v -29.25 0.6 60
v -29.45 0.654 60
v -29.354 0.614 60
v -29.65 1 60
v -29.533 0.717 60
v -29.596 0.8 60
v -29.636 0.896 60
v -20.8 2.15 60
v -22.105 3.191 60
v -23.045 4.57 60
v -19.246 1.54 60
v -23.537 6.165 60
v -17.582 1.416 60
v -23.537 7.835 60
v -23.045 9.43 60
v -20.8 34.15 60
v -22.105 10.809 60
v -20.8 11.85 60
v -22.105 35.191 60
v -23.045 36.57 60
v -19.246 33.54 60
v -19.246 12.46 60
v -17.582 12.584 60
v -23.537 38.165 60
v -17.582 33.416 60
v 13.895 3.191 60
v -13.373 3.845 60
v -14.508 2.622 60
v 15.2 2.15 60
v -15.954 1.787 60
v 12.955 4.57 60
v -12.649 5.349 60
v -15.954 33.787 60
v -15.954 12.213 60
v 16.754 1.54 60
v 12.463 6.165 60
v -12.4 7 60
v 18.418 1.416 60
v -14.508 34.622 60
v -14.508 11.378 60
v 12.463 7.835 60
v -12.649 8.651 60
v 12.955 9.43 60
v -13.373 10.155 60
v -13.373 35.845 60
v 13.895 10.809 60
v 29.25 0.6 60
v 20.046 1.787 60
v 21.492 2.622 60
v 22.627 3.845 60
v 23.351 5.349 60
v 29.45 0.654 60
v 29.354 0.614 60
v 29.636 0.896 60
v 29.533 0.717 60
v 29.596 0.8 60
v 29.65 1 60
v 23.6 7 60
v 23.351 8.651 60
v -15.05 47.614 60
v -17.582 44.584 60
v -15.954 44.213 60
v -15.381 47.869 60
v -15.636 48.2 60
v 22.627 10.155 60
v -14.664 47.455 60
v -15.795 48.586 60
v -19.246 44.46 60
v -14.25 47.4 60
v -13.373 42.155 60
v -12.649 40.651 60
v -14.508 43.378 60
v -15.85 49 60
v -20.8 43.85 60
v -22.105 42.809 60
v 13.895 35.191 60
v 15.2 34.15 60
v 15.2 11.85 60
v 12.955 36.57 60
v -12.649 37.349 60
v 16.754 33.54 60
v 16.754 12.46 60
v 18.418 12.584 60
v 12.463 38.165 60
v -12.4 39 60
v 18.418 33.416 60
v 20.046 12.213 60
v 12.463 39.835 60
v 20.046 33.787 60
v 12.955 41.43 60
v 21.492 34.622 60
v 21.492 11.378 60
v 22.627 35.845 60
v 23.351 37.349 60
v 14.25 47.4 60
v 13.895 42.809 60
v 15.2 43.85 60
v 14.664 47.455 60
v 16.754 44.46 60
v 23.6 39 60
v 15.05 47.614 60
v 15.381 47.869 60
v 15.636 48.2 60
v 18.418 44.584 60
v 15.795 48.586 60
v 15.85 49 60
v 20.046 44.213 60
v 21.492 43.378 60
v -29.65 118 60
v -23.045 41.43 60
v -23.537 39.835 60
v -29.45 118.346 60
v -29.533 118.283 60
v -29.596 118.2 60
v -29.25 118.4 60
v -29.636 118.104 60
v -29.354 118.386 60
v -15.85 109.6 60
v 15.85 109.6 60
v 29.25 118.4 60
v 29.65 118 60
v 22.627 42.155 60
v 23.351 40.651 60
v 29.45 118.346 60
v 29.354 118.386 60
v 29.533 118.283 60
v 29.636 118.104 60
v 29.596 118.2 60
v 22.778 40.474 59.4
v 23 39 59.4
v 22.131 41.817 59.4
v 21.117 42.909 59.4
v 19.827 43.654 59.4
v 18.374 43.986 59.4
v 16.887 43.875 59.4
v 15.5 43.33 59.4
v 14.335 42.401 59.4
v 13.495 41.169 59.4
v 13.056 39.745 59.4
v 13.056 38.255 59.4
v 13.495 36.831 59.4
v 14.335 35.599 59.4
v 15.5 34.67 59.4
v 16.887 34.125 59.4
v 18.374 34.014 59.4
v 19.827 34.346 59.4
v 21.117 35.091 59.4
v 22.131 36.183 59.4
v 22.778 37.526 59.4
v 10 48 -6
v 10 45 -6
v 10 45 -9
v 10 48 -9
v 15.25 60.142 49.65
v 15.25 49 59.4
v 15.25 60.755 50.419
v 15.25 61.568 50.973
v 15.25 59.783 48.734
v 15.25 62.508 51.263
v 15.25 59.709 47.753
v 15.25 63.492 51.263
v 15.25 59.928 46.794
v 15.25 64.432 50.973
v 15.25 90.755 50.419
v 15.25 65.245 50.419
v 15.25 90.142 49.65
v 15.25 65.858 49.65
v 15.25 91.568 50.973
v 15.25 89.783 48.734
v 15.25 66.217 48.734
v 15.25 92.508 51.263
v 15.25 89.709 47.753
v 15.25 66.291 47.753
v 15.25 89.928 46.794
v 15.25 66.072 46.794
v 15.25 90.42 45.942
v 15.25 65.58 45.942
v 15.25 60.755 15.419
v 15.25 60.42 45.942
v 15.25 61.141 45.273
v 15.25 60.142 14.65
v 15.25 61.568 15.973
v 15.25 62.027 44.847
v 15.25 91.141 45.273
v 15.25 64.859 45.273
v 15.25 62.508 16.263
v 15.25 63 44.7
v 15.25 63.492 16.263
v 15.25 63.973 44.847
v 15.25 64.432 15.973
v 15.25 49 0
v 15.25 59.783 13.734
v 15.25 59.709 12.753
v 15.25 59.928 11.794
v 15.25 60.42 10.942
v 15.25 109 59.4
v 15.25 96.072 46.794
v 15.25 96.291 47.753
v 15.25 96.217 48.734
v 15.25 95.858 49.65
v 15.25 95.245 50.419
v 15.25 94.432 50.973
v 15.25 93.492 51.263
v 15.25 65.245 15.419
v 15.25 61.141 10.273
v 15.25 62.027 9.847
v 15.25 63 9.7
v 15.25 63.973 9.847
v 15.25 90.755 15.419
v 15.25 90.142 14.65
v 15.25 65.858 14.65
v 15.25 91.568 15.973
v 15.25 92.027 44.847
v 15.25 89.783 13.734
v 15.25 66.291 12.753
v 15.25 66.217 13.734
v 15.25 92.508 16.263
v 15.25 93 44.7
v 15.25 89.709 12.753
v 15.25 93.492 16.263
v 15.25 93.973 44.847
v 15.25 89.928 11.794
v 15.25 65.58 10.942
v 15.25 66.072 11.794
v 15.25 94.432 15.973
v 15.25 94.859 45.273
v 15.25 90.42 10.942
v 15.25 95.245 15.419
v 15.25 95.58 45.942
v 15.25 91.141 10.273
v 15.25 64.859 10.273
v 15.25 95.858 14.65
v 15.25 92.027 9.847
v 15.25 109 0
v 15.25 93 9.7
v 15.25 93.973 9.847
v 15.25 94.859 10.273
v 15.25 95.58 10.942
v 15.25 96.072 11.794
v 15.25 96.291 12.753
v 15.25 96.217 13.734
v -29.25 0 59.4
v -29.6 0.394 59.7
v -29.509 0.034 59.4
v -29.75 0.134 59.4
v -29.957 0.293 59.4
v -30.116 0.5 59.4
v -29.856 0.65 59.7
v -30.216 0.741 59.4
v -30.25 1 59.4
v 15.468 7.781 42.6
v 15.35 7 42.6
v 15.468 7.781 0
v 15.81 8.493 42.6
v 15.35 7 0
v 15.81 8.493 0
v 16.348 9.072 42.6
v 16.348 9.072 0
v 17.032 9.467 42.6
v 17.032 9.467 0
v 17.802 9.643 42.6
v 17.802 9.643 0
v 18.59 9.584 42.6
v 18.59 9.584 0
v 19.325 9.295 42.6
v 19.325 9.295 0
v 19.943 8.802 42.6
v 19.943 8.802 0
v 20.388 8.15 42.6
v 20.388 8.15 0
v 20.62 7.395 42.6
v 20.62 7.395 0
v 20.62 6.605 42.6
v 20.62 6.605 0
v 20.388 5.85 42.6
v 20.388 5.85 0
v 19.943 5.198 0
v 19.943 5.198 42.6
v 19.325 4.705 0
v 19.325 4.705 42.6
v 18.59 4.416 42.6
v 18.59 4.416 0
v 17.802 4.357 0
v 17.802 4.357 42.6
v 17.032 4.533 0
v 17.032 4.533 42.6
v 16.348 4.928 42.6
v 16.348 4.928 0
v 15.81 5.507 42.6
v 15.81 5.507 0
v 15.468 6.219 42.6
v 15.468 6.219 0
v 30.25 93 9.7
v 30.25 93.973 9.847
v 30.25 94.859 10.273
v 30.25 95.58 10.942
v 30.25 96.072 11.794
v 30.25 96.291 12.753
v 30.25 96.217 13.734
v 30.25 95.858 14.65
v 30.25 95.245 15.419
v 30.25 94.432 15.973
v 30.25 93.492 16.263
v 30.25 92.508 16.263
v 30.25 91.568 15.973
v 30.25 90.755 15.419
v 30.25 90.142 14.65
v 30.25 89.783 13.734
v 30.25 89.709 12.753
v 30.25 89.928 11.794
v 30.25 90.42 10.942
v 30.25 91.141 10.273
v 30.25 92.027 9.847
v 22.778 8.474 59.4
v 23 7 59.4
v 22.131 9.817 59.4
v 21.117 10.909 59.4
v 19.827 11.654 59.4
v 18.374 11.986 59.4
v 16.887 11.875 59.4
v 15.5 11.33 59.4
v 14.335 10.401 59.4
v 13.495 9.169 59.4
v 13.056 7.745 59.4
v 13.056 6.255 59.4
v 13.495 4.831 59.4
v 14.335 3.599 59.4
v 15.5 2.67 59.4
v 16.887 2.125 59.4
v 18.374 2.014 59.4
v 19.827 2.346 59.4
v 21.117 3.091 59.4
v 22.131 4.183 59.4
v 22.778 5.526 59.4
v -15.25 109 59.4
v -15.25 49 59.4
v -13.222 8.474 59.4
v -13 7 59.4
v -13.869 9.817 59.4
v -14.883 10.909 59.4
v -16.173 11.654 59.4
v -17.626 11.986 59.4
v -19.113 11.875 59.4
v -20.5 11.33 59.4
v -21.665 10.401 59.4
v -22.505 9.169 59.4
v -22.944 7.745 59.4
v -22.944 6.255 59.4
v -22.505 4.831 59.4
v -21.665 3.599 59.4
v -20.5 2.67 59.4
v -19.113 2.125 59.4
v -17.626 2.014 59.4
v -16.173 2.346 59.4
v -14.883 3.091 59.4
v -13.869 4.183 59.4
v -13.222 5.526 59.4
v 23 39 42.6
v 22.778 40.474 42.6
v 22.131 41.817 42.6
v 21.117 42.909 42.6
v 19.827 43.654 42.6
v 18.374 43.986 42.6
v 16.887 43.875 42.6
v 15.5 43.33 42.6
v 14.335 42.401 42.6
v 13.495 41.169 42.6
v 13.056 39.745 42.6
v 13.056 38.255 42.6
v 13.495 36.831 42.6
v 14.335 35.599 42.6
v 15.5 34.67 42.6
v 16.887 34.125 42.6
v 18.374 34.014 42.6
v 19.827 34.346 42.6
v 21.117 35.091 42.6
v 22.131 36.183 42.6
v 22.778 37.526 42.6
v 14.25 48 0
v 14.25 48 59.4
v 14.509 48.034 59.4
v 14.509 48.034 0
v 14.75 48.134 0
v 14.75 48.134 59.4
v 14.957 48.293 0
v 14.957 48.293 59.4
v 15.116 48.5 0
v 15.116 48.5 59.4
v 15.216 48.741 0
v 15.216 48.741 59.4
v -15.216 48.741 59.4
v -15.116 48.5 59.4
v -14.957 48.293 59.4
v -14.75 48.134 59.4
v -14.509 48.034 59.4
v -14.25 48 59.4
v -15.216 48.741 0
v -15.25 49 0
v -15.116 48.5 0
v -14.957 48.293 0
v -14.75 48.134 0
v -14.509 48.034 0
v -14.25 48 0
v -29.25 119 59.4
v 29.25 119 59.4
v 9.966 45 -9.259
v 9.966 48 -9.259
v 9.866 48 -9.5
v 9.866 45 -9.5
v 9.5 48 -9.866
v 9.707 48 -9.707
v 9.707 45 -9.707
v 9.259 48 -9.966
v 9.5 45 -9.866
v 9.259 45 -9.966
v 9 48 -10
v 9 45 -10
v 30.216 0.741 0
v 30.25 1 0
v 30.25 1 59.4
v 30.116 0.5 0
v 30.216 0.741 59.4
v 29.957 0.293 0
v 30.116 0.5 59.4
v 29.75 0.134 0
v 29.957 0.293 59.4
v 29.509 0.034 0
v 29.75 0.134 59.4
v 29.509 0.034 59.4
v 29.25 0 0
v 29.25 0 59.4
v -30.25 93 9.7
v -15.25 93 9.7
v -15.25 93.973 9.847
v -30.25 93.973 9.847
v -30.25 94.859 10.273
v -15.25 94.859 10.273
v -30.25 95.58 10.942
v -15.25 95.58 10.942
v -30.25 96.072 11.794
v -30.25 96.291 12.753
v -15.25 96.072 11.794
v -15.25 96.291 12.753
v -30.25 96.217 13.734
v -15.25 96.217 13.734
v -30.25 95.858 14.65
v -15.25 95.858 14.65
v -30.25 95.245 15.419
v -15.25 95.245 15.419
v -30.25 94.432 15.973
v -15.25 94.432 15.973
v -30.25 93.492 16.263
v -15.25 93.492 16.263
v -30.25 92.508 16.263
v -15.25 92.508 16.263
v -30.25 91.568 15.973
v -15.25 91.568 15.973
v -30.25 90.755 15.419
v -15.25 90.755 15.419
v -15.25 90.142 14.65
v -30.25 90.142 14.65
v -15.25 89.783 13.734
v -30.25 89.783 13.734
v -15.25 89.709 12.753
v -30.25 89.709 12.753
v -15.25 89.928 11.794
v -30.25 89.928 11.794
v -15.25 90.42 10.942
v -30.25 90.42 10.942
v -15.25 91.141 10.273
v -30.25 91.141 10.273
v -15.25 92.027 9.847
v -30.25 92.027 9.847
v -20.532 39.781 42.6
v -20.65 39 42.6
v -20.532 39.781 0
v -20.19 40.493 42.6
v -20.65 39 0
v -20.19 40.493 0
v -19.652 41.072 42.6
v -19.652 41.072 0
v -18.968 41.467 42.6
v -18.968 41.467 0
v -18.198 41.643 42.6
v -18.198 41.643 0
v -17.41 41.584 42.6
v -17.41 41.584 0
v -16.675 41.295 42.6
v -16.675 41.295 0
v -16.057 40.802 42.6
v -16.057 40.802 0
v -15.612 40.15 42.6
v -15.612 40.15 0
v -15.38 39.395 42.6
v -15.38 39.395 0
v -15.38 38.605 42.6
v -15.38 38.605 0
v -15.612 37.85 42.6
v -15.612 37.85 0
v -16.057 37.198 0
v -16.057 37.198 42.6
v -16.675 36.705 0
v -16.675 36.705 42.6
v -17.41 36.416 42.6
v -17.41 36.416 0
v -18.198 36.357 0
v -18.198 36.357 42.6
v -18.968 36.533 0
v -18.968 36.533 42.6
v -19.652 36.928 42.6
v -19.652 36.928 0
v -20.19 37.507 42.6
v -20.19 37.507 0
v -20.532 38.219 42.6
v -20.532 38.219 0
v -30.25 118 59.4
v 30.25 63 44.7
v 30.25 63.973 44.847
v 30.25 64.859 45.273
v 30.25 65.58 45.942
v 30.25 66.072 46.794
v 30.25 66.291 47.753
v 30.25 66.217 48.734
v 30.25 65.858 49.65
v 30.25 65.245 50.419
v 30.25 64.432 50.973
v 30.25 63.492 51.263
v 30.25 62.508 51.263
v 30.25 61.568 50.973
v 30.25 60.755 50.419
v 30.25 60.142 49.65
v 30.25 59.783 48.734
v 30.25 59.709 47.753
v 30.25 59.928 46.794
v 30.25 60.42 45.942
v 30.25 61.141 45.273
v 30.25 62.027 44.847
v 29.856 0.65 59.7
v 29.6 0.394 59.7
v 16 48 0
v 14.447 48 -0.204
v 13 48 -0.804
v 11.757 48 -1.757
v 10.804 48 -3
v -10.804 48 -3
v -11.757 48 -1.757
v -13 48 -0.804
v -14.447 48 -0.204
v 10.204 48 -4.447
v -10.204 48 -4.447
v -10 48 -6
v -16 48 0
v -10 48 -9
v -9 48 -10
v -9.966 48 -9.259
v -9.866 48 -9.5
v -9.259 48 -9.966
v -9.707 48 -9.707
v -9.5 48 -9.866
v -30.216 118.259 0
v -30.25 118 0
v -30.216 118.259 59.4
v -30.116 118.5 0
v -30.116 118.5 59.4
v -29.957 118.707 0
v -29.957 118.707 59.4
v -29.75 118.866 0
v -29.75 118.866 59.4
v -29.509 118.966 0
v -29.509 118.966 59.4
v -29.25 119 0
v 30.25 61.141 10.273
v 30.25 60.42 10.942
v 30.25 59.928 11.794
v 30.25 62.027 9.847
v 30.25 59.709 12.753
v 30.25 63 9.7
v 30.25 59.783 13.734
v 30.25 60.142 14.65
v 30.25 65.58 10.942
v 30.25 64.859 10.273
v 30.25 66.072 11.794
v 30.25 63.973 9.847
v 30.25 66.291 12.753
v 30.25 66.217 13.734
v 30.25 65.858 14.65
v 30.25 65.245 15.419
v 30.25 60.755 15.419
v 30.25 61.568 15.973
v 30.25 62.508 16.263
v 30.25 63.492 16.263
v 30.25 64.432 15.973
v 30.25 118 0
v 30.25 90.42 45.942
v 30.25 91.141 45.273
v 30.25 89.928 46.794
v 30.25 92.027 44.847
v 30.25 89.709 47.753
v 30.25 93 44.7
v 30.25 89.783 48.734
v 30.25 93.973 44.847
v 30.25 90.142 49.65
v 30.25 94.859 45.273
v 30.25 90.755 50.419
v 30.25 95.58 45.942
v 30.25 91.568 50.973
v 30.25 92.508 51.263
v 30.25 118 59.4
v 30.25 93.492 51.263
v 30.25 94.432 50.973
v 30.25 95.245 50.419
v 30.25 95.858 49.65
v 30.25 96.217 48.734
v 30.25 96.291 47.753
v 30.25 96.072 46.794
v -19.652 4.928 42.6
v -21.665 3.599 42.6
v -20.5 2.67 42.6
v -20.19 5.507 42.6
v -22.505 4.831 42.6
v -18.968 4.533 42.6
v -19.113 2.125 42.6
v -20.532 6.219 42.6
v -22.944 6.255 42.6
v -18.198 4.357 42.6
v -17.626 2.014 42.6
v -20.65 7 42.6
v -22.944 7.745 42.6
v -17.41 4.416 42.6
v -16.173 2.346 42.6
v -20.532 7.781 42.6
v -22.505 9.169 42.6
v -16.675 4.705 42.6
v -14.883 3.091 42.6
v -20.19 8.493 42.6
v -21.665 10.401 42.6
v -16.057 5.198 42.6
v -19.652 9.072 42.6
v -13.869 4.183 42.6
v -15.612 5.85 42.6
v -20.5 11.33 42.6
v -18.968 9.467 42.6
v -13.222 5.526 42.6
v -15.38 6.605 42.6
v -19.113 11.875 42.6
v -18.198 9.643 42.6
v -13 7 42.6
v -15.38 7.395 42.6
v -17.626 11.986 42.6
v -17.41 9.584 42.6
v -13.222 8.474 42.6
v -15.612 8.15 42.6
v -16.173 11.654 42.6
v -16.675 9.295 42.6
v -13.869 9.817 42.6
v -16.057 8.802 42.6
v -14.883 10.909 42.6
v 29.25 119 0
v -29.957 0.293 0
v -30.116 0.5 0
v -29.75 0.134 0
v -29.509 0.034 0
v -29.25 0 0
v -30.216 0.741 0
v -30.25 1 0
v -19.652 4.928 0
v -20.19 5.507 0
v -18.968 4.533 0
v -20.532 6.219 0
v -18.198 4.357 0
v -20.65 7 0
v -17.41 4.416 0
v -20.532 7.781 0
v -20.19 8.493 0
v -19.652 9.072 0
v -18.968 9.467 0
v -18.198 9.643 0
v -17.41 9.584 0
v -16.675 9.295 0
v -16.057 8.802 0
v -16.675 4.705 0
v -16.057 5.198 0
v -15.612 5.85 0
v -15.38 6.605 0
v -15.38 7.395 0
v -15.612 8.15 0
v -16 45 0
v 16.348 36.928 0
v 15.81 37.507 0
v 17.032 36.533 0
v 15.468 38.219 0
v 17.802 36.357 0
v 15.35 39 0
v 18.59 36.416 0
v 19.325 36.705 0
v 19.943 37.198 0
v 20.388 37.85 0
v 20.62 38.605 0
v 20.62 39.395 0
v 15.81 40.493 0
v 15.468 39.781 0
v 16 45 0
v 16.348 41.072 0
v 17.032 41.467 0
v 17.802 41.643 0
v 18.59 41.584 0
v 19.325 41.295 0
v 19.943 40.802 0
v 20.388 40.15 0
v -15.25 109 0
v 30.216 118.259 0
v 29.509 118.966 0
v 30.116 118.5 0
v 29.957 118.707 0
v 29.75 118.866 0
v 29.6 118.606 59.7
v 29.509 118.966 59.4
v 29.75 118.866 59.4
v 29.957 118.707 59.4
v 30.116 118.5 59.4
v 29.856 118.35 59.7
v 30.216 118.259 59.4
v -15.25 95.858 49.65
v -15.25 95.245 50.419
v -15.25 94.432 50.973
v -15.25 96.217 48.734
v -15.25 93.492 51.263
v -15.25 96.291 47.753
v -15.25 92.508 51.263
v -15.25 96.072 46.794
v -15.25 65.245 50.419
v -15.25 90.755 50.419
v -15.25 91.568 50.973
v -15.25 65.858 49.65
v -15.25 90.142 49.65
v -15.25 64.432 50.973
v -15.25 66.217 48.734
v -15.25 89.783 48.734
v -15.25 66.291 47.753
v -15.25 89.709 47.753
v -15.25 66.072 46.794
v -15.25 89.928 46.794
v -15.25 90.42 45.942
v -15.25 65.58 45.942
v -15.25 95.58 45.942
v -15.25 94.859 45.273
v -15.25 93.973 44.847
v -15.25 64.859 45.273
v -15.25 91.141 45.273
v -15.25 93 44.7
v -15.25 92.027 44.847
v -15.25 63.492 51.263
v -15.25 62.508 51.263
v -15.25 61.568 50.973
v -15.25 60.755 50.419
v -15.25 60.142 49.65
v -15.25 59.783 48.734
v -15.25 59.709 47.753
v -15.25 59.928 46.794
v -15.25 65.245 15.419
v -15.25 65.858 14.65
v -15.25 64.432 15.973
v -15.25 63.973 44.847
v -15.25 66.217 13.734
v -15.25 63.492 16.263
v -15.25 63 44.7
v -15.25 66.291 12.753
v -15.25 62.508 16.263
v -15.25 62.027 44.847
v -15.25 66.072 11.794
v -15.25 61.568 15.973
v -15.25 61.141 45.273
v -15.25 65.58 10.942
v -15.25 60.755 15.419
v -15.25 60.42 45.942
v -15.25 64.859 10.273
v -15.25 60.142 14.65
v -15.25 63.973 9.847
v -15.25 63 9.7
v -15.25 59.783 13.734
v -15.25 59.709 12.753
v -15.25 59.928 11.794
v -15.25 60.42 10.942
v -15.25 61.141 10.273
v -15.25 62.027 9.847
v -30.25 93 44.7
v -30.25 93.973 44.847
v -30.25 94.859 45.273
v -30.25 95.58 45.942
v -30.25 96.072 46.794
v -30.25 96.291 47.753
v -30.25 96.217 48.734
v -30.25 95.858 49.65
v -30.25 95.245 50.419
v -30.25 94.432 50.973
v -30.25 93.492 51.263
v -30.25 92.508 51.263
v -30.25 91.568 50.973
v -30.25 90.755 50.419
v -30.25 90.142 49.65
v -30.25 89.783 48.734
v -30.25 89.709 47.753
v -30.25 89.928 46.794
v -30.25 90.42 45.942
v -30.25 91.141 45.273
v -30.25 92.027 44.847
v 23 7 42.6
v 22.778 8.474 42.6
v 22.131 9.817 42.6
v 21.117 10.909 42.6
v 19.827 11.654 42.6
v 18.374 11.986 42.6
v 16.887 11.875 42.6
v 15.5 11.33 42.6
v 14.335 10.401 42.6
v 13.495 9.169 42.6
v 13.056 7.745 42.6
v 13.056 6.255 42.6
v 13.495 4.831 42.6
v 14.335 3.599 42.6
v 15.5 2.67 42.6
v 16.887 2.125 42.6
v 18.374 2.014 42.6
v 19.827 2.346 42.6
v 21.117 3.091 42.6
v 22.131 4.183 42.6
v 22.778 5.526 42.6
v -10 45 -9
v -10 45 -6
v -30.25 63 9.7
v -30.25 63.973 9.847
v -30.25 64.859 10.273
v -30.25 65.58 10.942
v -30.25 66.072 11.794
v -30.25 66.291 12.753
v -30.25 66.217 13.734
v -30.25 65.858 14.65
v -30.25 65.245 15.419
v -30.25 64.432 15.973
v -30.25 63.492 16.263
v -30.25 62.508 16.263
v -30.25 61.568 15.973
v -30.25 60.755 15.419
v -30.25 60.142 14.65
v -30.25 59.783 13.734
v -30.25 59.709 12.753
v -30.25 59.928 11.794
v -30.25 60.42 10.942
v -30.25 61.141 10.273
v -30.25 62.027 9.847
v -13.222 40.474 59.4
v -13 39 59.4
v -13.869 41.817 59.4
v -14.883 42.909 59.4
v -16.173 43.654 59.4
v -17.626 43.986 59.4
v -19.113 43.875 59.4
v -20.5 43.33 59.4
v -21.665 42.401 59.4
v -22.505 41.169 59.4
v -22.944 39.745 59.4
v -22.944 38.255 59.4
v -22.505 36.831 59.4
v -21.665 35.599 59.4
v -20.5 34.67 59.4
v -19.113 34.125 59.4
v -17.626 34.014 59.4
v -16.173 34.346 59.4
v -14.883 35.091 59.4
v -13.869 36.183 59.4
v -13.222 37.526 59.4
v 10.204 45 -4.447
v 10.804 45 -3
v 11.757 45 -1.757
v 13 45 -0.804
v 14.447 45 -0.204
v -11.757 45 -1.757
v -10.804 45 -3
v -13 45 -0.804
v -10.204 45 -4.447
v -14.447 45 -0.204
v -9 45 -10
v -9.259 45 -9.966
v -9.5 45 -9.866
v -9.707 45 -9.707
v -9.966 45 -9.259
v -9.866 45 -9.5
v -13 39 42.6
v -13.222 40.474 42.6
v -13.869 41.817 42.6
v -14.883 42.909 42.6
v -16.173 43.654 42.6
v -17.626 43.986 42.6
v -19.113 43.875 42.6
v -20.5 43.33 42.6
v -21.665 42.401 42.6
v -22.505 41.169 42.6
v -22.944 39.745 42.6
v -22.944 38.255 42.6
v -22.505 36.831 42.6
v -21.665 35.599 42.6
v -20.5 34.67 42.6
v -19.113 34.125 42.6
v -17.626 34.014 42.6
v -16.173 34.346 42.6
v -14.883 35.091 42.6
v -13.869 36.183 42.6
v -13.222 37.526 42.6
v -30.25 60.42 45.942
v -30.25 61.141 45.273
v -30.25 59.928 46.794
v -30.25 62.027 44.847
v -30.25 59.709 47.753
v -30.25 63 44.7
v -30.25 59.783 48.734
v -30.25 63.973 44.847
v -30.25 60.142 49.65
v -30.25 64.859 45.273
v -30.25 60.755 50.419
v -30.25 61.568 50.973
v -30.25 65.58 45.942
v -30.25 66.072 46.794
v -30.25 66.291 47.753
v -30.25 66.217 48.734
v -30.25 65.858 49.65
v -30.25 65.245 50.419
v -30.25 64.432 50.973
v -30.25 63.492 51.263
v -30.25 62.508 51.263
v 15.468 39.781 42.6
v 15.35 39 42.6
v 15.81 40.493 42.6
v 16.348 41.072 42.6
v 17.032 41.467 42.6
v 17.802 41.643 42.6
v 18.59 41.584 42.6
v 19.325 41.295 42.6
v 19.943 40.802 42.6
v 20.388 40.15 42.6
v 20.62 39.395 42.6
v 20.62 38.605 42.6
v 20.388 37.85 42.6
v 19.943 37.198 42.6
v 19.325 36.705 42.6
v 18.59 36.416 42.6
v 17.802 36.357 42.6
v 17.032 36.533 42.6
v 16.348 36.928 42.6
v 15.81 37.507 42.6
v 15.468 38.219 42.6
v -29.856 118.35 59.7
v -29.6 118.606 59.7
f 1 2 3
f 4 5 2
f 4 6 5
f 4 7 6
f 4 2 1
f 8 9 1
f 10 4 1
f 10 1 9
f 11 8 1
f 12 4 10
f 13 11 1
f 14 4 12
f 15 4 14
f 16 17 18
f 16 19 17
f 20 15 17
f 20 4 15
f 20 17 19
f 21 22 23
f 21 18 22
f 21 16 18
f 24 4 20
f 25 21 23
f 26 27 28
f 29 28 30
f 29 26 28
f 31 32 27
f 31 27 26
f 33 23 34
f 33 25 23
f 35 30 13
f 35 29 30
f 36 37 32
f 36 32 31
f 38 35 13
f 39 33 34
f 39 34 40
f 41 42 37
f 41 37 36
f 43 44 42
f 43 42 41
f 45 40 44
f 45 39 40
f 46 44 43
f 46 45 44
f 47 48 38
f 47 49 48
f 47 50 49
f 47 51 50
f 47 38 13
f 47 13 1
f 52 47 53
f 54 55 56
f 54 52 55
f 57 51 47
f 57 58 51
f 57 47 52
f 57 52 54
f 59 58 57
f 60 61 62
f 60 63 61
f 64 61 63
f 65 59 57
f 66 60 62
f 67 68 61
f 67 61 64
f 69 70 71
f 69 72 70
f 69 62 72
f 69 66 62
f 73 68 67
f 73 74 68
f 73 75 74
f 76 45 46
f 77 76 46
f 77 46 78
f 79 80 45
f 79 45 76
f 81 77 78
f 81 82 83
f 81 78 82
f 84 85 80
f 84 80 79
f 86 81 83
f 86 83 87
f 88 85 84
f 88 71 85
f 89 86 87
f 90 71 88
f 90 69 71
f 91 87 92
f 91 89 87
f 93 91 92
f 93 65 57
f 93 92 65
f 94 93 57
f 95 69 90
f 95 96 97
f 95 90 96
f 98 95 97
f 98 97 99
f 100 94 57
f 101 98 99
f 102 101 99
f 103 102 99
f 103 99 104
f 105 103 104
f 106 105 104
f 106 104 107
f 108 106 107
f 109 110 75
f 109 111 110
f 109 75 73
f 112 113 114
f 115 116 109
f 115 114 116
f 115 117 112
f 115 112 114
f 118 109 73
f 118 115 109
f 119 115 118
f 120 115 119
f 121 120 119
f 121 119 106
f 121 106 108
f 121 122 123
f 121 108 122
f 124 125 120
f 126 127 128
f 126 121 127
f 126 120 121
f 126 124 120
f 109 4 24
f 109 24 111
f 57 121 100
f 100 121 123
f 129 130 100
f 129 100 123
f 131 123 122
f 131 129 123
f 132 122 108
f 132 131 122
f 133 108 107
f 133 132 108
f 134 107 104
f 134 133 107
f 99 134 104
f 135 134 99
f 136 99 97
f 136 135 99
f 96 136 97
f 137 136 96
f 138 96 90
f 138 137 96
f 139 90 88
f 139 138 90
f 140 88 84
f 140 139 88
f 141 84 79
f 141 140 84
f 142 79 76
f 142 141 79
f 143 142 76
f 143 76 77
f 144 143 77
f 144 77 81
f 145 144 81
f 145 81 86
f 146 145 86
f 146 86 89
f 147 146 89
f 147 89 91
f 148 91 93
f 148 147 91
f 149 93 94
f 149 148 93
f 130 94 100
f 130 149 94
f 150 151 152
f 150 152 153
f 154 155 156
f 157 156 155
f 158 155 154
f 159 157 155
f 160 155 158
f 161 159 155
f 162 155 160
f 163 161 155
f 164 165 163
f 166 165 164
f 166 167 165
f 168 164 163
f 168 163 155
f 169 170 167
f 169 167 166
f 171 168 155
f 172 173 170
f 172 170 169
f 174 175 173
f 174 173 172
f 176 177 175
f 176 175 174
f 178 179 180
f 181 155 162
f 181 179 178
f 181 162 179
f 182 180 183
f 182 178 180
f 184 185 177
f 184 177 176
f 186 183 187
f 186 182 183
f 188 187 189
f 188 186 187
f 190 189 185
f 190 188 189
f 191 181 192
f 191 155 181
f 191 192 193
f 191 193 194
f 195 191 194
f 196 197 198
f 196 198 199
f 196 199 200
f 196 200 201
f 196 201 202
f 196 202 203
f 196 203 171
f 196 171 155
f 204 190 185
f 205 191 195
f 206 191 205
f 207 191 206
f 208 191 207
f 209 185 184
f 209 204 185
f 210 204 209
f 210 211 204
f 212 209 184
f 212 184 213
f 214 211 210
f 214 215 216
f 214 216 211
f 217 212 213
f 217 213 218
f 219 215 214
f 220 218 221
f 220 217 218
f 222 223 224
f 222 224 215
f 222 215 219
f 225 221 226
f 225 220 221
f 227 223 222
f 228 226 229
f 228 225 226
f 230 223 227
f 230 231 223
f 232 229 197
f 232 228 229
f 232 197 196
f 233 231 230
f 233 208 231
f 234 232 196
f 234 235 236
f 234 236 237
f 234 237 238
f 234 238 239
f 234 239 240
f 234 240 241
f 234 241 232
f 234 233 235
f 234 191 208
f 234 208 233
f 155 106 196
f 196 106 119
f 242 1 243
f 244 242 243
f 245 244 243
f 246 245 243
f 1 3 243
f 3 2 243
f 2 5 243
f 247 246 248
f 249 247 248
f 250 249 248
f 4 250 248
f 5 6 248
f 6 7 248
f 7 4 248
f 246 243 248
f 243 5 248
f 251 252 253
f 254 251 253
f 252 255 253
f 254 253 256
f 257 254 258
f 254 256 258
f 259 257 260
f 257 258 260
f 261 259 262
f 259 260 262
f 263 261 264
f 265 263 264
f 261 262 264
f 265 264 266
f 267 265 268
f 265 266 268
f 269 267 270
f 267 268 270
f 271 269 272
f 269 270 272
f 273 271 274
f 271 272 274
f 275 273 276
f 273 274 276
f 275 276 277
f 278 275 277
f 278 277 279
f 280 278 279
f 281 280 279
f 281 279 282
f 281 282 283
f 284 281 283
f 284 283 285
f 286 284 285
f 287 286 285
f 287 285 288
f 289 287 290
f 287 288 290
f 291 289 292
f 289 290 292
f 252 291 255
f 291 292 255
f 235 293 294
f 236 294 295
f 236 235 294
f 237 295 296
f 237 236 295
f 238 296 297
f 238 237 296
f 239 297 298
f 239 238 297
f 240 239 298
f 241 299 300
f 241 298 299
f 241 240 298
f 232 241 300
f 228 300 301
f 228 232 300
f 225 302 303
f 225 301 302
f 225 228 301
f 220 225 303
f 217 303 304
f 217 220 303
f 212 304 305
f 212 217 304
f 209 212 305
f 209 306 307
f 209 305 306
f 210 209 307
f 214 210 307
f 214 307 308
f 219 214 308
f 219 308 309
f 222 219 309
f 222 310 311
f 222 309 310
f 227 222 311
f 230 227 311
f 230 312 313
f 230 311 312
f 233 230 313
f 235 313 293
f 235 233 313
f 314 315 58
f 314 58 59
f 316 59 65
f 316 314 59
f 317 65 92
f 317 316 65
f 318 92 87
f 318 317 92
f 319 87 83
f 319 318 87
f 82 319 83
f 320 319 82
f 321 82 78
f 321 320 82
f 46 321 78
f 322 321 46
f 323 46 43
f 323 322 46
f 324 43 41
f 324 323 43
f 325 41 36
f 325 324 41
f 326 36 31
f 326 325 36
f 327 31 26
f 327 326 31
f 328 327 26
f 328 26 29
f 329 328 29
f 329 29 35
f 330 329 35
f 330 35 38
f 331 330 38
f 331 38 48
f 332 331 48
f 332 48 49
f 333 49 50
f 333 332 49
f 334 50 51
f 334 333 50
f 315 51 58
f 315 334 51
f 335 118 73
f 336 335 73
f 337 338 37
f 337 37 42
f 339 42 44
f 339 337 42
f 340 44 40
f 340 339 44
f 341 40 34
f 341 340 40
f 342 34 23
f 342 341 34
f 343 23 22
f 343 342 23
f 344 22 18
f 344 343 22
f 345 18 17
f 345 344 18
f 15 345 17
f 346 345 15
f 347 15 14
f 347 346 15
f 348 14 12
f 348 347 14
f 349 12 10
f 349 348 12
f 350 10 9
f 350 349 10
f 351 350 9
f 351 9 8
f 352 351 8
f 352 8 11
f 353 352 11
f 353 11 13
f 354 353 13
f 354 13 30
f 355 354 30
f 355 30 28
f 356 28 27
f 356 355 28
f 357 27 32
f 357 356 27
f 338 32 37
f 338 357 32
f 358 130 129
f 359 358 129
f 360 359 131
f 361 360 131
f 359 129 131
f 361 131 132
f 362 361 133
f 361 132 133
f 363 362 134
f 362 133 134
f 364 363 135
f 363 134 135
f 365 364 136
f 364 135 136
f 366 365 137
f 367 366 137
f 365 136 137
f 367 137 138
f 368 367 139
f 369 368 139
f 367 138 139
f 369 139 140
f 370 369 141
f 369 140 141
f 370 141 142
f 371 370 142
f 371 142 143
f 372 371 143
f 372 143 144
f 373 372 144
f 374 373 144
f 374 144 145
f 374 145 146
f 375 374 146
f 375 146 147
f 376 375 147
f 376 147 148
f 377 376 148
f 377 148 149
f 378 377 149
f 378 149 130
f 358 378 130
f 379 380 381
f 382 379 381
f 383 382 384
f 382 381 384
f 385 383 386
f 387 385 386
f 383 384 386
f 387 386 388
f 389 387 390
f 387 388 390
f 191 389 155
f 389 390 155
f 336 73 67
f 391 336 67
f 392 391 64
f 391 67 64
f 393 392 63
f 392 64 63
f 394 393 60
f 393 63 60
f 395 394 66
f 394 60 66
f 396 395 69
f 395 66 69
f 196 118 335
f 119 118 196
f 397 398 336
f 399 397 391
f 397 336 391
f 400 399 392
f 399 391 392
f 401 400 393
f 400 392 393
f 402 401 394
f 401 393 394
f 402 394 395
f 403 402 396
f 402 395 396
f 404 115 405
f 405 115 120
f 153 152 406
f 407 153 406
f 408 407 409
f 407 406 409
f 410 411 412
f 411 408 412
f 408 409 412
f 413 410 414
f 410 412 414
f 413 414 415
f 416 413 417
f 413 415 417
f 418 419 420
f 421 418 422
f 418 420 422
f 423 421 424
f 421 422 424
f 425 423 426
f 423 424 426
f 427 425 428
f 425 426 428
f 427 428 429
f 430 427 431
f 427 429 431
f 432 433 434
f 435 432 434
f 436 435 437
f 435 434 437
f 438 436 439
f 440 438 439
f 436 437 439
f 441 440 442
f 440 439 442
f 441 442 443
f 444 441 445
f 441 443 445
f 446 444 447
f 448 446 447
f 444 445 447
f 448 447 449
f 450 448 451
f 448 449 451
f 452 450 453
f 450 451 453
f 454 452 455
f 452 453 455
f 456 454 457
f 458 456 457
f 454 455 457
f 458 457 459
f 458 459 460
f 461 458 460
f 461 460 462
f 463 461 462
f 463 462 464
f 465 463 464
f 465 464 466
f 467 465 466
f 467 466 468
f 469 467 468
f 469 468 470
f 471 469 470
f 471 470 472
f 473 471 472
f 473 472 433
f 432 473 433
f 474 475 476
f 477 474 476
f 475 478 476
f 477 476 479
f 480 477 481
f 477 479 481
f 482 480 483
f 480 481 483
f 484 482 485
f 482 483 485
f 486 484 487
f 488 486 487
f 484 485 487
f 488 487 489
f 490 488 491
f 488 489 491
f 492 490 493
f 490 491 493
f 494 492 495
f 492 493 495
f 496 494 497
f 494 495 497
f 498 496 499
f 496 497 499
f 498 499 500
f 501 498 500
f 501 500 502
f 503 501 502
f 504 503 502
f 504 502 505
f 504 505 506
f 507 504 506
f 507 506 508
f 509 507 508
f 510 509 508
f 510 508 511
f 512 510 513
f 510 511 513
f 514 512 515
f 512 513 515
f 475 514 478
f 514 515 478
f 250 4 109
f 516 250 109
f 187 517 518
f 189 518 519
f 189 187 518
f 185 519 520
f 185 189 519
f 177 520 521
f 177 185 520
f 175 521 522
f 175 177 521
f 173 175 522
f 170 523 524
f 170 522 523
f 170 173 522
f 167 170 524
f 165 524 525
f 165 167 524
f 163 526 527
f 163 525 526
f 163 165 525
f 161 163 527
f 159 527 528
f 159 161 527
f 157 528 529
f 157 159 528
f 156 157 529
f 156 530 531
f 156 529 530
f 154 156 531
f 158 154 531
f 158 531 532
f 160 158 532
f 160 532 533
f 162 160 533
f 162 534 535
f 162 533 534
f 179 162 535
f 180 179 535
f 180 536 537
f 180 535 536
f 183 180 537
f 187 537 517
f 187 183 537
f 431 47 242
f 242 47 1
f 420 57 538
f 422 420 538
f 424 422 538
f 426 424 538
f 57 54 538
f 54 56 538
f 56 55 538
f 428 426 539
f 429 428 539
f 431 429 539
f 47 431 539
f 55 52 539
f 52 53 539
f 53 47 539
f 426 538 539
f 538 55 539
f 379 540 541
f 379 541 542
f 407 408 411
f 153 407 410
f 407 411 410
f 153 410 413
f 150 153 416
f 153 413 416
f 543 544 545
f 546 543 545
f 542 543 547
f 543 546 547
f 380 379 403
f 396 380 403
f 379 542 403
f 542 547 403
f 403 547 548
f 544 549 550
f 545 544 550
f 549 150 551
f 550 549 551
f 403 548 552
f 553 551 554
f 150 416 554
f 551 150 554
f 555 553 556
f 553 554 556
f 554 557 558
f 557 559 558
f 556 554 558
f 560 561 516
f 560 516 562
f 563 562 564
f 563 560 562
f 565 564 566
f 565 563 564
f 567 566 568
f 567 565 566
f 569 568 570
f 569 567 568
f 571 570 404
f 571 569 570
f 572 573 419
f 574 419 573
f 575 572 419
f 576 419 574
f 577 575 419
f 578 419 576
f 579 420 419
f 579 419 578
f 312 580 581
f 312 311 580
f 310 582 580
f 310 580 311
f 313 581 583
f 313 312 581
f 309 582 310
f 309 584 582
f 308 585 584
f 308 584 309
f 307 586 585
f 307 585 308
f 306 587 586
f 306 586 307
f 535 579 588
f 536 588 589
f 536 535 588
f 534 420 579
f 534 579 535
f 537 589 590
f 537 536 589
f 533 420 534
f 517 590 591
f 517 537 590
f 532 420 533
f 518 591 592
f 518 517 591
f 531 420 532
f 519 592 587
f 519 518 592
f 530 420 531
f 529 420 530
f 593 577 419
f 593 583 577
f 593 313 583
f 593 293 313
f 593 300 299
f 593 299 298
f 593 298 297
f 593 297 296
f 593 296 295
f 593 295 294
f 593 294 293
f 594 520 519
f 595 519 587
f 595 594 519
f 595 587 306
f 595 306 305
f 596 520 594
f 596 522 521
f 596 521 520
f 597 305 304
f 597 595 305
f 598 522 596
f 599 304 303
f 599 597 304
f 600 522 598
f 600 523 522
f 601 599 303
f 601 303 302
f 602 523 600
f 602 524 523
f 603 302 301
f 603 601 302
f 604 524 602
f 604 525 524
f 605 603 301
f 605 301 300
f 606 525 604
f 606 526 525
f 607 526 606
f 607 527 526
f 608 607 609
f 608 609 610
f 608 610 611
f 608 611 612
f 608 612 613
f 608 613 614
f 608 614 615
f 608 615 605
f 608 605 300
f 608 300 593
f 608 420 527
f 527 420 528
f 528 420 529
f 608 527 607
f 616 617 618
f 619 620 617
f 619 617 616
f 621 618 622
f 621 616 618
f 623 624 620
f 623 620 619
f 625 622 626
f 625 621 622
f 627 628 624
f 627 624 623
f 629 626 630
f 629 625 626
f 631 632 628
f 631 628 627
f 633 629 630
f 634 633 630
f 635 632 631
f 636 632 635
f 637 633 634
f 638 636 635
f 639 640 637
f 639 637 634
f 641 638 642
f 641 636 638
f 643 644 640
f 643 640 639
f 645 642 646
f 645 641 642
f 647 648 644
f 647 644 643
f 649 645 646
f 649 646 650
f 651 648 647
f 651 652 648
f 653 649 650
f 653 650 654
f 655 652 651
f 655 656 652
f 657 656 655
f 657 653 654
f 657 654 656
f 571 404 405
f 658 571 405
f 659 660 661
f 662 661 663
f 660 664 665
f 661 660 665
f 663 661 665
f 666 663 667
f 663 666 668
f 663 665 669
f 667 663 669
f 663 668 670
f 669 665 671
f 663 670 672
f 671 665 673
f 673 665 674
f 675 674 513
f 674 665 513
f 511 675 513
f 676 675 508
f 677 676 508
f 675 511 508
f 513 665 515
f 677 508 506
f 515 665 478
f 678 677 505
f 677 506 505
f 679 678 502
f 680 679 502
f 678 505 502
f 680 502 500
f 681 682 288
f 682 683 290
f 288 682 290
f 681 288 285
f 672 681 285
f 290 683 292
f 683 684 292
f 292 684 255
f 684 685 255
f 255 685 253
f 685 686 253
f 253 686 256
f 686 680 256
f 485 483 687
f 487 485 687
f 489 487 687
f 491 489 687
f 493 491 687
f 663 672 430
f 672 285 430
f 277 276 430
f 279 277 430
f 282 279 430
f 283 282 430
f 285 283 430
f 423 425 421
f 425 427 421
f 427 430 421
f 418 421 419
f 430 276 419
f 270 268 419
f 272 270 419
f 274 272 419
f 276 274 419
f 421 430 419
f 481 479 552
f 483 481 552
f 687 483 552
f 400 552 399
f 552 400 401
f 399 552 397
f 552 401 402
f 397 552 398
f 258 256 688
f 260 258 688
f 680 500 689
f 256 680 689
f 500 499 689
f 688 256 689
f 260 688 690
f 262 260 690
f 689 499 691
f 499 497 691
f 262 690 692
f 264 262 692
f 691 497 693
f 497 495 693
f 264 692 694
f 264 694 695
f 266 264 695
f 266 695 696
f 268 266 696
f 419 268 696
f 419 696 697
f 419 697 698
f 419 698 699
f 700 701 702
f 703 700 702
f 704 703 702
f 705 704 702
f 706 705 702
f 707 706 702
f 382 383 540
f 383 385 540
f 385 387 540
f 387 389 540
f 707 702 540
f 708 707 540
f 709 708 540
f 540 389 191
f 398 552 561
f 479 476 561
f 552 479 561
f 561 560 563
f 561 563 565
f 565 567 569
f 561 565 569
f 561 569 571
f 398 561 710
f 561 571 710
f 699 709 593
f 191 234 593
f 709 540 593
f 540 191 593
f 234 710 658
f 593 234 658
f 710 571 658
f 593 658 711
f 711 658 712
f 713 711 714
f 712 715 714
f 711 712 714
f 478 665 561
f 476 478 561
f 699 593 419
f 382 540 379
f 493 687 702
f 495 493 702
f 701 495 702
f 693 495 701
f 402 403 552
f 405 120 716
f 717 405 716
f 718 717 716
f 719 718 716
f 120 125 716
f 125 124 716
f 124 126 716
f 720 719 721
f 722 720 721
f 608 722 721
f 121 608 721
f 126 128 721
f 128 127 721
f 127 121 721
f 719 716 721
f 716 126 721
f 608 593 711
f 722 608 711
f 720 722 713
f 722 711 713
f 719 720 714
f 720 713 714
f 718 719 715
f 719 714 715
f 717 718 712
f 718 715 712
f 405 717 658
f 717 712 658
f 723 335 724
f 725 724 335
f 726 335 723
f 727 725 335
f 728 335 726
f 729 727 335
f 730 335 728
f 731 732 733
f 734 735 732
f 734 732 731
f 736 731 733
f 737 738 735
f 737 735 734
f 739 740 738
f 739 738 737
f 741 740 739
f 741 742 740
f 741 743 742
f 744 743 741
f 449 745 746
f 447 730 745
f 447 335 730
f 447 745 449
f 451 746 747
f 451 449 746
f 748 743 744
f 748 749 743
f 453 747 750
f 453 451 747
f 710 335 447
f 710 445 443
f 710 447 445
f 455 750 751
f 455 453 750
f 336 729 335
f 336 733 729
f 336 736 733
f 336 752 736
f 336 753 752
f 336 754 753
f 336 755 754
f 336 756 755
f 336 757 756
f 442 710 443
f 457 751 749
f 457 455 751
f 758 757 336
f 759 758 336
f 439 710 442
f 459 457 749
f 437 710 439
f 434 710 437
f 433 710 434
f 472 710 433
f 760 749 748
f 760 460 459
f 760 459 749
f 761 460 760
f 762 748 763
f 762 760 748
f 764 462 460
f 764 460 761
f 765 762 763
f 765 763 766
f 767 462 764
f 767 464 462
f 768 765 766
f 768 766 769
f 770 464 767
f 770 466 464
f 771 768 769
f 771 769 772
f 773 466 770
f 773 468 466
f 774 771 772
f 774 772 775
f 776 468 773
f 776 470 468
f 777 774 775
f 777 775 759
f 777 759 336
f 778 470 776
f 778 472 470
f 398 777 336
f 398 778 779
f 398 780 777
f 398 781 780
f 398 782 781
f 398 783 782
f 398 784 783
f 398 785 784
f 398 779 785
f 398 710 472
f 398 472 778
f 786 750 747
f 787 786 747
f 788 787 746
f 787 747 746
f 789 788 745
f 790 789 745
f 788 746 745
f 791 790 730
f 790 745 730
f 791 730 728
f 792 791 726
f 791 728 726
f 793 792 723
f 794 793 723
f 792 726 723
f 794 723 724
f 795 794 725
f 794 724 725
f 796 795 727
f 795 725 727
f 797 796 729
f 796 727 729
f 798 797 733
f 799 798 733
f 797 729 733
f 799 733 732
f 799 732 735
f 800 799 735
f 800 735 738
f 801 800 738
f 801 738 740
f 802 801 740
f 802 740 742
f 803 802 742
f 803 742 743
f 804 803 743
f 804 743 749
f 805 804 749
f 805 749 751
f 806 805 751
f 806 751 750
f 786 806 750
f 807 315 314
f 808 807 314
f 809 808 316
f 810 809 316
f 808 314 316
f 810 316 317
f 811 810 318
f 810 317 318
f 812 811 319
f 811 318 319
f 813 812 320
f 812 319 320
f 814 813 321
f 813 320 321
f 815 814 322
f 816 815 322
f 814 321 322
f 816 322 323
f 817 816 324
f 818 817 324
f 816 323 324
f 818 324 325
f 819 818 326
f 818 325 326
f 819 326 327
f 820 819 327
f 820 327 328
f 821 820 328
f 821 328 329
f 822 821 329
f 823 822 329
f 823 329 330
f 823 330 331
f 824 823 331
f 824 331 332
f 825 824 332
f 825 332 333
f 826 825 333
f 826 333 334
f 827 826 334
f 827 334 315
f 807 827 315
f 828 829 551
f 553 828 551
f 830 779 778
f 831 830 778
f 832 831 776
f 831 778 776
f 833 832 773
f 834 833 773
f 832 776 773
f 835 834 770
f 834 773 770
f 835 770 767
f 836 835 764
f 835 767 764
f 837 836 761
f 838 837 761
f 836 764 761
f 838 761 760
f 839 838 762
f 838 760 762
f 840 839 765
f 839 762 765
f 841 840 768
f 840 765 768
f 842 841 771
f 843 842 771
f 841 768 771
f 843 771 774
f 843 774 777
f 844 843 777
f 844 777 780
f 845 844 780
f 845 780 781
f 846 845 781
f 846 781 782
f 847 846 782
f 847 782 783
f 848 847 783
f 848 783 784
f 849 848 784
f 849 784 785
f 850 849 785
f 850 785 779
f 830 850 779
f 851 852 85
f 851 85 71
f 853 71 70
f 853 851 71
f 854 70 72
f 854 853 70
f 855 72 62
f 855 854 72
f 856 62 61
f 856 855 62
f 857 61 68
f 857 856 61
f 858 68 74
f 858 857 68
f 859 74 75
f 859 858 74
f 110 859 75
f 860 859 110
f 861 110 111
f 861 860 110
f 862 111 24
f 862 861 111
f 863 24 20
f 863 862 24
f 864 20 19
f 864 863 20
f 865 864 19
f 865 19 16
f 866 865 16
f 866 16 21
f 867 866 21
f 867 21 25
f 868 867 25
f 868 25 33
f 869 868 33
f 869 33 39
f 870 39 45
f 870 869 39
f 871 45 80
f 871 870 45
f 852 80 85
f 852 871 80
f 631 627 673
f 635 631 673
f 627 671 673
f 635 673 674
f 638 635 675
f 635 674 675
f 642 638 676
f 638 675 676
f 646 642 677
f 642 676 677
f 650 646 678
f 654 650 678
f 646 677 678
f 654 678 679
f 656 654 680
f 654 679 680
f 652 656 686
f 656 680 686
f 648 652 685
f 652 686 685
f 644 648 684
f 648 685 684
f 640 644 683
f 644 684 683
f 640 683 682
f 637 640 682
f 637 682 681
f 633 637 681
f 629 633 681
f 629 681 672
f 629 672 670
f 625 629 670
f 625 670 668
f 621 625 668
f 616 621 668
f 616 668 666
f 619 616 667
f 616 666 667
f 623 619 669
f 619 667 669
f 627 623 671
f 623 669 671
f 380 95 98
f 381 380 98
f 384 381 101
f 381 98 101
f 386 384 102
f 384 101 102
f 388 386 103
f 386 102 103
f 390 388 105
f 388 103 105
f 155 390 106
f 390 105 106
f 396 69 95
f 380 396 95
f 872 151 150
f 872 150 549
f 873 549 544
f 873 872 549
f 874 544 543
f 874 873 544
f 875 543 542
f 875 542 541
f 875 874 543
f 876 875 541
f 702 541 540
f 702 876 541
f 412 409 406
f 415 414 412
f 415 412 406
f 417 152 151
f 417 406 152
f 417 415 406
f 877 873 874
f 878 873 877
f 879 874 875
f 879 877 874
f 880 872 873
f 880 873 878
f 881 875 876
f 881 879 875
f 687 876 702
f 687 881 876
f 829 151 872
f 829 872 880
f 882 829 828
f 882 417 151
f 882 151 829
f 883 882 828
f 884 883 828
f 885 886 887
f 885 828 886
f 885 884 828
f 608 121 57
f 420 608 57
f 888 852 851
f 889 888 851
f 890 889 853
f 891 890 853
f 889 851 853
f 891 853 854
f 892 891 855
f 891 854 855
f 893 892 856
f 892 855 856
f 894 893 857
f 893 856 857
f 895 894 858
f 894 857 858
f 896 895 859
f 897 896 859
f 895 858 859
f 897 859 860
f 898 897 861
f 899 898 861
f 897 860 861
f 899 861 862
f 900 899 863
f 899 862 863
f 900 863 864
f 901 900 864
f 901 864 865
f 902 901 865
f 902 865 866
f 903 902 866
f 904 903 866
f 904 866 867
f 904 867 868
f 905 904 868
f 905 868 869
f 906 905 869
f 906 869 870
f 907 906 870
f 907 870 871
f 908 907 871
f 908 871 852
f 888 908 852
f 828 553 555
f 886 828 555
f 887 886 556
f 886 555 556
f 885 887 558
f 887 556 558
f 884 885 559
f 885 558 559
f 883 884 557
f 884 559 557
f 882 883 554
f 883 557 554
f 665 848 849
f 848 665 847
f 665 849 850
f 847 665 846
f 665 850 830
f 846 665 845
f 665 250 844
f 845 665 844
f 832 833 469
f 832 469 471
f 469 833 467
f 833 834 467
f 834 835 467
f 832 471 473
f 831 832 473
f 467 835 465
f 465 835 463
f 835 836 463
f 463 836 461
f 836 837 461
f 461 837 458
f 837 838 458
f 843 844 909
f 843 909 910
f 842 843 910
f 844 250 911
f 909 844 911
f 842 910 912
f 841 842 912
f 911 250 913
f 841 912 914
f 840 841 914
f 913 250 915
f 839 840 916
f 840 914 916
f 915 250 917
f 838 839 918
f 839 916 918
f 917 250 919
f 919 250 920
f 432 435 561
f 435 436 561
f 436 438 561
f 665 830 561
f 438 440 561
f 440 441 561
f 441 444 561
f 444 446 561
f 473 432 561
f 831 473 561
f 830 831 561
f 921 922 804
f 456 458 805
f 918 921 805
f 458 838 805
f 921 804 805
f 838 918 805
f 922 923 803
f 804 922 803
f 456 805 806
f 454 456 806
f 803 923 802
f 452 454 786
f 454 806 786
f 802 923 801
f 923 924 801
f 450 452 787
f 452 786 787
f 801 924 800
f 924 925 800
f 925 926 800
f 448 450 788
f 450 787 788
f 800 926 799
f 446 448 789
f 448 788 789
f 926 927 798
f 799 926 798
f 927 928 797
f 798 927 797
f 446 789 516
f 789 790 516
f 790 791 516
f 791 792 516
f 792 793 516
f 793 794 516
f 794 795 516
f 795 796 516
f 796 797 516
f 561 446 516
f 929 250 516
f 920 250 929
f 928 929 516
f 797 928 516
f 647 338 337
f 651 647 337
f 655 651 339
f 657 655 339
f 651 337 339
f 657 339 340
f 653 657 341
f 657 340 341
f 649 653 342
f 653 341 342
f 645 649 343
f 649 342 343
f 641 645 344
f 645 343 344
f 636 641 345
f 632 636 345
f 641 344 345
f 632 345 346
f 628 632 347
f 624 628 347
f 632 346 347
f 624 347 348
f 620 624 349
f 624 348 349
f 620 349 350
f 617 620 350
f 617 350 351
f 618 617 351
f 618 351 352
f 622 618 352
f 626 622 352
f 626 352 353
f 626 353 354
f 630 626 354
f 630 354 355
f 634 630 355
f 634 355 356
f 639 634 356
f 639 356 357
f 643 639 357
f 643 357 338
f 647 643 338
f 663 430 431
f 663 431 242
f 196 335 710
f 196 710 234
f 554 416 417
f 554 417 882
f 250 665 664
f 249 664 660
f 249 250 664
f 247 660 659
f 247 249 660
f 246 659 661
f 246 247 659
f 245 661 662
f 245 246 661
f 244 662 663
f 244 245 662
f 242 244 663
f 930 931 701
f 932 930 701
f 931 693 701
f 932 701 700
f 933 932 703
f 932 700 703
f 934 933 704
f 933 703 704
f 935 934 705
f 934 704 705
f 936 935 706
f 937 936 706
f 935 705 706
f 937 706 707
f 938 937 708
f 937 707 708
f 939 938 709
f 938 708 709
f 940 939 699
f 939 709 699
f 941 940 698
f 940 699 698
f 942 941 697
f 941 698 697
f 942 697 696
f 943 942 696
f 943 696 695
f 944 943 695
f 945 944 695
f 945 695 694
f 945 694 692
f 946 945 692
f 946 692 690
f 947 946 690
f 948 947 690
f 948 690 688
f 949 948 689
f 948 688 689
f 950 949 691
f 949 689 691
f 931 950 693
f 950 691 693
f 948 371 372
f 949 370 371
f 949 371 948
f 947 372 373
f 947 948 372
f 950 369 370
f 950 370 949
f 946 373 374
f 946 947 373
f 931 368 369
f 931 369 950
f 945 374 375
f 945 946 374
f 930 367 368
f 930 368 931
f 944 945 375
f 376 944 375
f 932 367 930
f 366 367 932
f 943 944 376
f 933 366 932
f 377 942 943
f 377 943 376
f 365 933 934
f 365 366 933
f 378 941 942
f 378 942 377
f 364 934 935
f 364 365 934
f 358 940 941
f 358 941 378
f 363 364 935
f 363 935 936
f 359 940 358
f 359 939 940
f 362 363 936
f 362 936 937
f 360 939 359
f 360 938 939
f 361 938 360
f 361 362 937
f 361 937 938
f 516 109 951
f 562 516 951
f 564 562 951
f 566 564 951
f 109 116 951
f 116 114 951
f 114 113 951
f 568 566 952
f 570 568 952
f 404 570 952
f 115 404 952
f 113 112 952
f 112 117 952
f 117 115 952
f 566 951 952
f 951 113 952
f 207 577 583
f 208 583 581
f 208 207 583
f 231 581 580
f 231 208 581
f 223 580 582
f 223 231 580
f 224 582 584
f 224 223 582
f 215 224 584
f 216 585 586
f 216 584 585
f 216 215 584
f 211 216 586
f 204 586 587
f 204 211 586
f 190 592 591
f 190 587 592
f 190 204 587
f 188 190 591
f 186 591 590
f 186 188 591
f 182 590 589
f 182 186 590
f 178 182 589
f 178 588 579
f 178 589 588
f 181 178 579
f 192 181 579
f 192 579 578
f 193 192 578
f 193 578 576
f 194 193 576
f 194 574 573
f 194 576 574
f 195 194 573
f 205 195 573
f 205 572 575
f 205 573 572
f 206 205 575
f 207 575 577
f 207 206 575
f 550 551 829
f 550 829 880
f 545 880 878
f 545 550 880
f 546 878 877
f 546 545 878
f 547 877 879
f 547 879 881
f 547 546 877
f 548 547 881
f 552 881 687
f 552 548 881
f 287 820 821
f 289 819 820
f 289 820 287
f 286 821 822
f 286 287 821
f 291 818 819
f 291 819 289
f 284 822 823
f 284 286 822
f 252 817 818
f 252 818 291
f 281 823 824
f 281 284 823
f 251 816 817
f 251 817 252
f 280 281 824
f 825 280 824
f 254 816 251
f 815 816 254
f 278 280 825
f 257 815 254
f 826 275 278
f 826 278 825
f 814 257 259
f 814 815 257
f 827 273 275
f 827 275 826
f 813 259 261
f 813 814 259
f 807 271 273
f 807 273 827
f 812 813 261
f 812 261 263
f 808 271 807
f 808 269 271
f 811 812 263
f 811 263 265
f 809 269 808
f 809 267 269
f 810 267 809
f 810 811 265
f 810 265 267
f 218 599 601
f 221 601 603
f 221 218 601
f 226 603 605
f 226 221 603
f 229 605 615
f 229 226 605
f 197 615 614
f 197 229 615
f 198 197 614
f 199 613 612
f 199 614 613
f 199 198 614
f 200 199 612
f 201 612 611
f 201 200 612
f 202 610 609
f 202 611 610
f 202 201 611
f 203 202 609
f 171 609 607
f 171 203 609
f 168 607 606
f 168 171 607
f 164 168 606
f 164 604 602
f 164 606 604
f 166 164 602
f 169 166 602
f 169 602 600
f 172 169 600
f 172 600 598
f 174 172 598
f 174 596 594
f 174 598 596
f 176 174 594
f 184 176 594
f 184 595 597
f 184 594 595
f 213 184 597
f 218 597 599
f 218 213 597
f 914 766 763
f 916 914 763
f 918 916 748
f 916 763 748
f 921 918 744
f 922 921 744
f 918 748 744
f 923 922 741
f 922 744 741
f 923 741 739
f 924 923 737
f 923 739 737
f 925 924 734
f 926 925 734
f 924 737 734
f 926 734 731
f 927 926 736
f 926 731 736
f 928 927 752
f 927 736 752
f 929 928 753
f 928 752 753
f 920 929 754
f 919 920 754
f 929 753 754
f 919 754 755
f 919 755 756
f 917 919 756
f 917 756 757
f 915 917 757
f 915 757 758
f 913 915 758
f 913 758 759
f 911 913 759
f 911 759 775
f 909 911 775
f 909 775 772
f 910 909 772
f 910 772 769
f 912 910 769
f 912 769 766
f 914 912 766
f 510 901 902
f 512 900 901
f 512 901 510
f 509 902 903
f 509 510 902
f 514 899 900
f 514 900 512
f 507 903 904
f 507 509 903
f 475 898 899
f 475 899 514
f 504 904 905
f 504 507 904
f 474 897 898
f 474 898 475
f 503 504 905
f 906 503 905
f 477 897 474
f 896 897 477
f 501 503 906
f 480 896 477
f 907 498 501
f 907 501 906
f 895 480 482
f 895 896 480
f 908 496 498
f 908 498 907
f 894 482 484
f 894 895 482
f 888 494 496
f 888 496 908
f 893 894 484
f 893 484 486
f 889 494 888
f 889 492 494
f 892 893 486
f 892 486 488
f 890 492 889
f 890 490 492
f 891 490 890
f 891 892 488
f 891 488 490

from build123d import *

# Parameters (mm, degrees)
BOSS_EXTRUDE1_DEPTH                                 = 60
CBORE_FOR_M5_HEX_SOCKET_HEAD_CAP_SCREW1_D           = 5.3
CBORE_FOR_M5_HEX_SOCKET_HEAD_CAP_SCREW1_CBORE_D     = 10
CBORE_FOR_M5_HEX_SOCKET_HEAD_CAP_SCREW1_CBORE_DEPTH = 17.4
M6_CLEARANCE_HOLE1_D                                = 6.6
M6_CLEARANCE_HOLE1_DEPTH                            = 15
SKETCH8_W                                           = 20
SKETCH8_H                                           = 3
BOSS_EXTRUDE2_DEPTH                                 = 10
SKETCH9_W                                           = 60.5
SKETCH9_H                                           = 10
BOSS_EXTRUDE3_DEPTH                                 = 60
FILLET1_R                                           = 1
FILLET2_R                                           = 6
FILLET2_R_2                                         = 1
CHAMFER1_SIZE                                       = 0.6


with BuildPart() as part:
    # Sketch1 → Boss-Extrude1 (new body)
    with BuildSketch(Plane.XY):
        Polygon((30.25, 0), (-30.25, 0), (-30.25, 109), (-15.25, 109), (-15.25, 48), (15.25, 48), (15.25, 109), (30.25, 109), align=None)
    extrude(amount=BOSS_EXTRUDE1_DEPTH)

    # CBORE for M5 Hex Socket Head Cap Screw1 (through all)
    with Locations(Plane.XY.offset(60)):
        with Locations((-18, 7), (18, 7), (18, 39), (-18, 39)):
            CounterBoreHole(CBORE_FOR_M5_HEX_SOCKET_HEAD_CAP_SCREW1_D / 2, CBORE_FOR_M5_HEX_SOCKET_HEAD_CAP_SCREW1_CBORE_D / 2, CBORE_FOR_M5_HEX_SOCKET_HEAD_CAP_SCREW1_CBORE_DEPTH)

    # M6 Clearance Hole1
    with Locations(Plane.ZY.offset(30.25)):
        with Locations((48, 93), (13, 93), (13, 63), (48, 63)):
            m6_clearance_hole1 = Hole(M6_CLEARANCE_HOLE1_D / 2, depth=M6_CLEARANCE_HOLE1_DEPTH)

    # Mirror1: M6 Clearance Hole1 across plane
    add(m6_clearance_hole1.mirror(Plane(origin=(0, 0, 0), x_dir=(0, 0, 1), z_dir=(1, 0, 0))), mode=Mode.SUBTRACT)

    # Sketch8 → Boss-Extrude2 (add)
    with BuildSketch(Plane(origin=(0, 0, 0), x_dir=(-1, 0, 0), z_dir=(0, 0, -1))):
        with Locations((0, 46.5)):
            Rectangle(SKETCH8_W, SKETCH8_H)
    extrude(amount=BOSS_EXTRUDE2_DEPTH)

    # Sketch9 → Boss-Extrude3 (add)
    with BuildSketch(Plane.XY.offset(60)):
        with Locations((0, 114)):
            Rectangle(SKETCH9_W, SKETCH9_H)
    extrude(amount=-BOSS_EXTRUDE3_DEPTH)

    # Fillet1
    fillet1_edges = [part.edges().sort_by_distance(p)[0] for p in [
        (30.25, 119, 30),
        (-30.25, 119, 30),
        (-15.25, 48, 30),
        (15.25, 48, 30),
        (30.25, 0, 30),
        (-30.25, 0, 30),
    ]]
    fillet(fillet1_edges, radius=FILLET1_R)

    # Fillet2
    # the kernel refuses this fillet: 6, 1 mm, written as the material it adds along each edge
    with BuildSketch(Plane(origin=(10, 45, 0), x_dir=(1, 0, 0), z_dir=(0, 1, 0)), Plane(origin=(-10, 48, 0), x_dir=(-1, 0, 0), z_dir=(0, -1, 0))) as fillet2_piece_1:
        with BuildLine():
            CenterArc((FILLET2_R, FILLET2_R), FILLET2_R, 180, 90)
            Line((0, FILLET2_R), (0, 0))
            Line((0, 0), (FILLET2_R, 0))
        make_face()
    extrude(amount=3)
    # the kernel refuses this fillet: 6, 1 mm, written as the material it takes off along each edge
    with BuildSketch(Plane(origin=(10, 42.5, -10), x_dir=(-1, 0, 0), z_dir=(0, 1, 0))) as fillet2_2_piece_1:
        with BuildLine():
            CenterArc((FILLET2_R_2, FILLET2_R_2), FILLET2_R_2, 180, 90)
            Line((0, FILLET2_R_2), (0, 0))
            Line((0, 0), (FILLET2_R_2, 0))
        make_face()
    extrude(amount=8, mode=Mode.SUBTRACT)
    with BuildSketch(Plane(origin=(-10, 50.5, -10), x_dir=(0, 0, 1), z_dir=(0, -1, 0))) as fillet2_2_piece_2:
        with BuildLine():
            CenterArc((FILLET2_R_2, -FILLET2_R_2), FILLET2_R_2, 90, 90)
            Line((0, -FILLET2_R_2), (0, 0))
            Line((0, 0), (FILLET2_R_2, 0))
        make_face()
    extrude(amount=8, mode=Mode.SUBTRACT)

    # Chamfer1
    chamfer1_edges = [part.edges().sort_by_distance(p)[0] for p in [
        (0, 109, 60),
        (0, 119, 60),
        (-30.25, 59.5, 60),
        (0, 0, 60),
        (30.25, 59.5, 60),
        (-15.25, 79, 60),
        (0, 48, 60),
        (-29.957106781, 0.292893219, 60),
        (29.957106781, 0.292893219, 60),
        (29.957106781, 118.707106781, 60),
        (-29.957106781, 118.707106781, 60),
        (14.957106781, 48.292893219, 60),
        (-14.957106781, 48.292893219, 60),
        (15.25, 79, 60),
        (-23, 39, 60),
        (13, 39, 60),
        (13, 7, 60),
        (-23, 7, 60),
    ]]
    chamfer(chamfer1_edges, length=CHAMFER1_SIZE)


solid = part.part
